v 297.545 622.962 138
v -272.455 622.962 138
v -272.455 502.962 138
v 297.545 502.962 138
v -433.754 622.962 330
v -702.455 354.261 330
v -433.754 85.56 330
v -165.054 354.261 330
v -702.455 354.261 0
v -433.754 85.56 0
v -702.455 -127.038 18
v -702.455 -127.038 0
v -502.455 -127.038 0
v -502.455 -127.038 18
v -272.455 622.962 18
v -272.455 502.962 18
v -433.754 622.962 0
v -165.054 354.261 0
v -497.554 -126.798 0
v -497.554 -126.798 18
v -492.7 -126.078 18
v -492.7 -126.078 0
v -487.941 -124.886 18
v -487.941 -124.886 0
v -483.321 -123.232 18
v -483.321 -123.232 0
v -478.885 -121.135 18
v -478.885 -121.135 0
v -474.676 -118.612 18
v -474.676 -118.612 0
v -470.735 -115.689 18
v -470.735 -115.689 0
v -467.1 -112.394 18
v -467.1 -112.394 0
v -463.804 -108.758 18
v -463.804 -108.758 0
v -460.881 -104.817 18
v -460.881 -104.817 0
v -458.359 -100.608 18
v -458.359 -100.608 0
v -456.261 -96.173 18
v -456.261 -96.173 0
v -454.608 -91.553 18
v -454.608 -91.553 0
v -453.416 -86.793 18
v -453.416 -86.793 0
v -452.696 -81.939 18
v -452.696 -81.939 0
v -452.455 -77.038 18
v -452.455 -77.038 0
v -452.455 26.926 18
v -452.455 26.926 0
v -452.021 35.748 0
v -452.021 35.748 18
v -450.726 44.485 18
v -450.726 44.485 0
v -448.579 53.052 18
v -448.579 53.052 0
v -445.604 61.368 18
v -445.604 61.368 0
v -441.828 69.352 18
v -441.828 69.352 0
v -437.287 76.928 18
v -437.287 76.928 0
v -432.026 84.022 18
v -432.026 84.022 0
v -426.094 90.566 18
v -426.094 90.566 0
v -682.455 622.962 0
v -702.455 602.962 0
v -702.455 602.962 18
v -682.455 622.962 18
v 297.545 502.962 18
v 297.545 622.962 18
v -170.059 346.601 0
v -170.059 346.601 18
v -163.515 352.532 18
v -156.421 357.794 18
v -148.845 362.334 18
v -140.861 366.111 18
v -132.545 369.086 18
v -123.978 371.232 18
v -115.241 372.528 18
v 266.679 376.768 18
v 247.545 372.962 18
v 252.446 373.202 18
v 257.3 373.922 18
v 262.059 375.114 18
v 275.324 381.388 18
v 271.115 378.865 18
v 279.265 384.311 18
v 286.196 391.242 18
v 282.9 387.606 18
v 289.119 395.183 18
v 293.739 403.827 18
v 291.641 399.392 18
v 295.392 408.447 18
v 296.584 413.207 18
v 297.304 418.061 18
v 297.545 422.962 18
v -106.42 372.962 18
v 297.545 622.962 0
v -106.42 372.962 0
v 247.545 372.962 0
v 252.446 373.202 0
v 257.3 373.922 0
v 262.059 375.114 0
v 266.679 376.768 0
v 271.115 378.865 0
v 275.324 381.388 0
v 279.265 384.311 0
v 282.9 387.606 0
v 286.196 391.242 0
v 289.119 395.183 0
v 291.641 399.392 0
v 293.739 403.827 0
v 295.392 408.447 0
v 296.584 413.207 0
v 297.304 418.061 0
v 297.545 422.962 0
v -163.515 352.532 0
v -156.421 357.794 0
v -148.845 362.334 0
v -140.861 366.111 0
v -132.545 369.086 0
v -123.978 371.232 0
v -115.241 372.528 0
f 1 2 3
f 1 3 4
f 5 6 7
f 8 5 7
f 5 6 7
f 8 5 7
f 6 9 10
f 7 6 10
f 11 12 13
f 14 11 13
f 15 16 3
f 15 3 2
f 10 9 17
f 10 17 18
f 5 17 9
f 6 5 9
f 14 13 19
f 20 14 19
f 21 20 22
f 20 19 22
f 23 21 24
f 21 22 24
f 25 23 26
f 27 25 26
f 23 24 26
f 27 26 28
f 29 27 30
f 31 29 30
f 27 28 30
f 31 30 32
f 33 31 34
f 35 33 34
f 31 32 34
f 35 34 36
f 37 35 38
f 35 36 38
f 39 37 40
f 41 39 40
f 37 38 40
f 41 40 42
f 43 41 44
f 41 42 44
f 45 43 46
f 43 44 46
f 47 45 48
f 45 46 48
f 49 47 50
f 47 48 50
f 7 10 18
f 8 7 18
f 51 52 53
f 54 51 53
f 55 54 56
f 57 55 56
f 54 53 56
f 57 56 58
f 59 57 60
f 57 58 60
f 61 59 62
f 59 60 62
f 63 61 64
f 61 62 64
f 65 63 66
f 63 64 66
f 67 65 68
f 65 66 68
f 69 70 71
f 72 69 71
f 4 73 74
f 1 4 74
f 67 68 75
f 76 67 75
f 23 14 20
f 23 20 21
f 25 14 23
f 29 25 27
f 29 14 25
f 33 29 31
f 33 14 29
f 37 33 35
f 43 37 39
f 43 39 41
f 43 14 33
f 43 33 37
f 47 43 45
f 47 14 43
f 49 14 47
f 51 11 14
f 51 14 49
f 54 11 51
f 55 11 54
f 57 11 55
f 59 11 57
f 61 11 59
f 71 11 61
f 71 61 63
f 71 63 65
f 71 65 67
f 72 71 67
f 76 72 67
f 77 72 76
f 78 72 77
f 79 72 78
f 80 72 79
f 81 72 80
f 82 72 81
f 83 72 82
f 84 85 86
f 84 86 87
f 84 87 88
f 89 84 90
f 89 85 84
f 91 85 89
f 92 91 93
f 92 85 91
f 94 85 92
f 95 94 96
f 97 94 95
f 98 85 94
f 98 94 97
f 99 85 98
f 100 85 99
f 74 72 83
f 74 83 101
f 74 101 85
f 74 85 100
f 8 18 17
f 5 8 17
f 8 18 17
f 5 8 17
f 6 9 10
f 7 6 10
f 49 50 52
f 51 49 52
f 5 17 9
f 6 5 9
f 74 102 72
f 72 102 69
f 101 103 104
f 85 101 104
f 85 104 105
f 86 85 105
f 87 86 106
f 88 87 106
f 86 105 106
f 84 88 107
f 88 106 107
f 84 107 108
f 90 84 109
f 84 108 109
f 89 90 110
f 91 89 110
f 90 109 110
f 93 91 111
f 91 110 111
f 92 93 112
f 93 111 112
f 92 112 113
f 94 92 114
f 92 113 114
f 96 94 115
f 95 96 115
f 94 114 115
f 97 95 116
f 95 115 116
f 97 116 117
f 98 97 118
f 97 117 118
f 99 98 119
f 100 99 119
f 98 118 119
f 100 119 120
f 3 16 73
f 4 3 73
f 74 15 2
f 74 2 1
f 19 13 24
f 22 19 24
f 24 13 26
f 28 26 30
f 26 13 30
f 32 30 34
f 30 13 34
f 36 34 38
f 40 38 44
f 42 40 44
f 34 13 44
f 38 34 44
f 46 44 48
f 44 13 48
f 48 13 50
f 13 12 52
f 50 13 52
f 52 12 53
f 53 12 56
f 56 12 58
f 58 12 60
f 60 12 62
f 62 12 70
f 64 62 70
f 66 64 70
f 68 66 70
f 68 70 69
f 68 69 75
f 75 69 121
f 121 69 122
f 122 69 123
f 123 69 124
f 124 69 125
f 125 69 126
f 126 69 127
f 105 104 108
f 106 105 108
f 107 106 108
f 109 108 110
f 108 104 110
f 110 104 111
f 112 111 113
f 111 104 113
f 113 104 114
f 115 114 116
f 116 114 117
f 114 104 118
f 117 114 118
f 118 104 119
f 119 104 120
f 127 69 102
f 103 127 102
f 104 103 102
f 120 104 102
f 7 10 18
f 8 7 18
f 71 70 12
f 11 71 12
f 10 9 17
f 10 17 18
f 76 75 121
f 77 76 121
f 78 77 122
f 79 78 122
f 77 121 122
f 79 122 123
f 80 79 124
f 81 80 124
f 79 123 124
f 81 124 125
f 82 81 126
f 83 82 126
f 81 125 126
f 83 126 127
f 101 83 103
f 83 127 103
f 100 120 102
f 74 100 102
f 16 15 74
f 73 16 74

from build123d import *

# Parameters (mm, degrees)
F1_DEPTH = 18
F2_SIZE  = 20
F4_DEPTH = 330
F5_DEPTH = 330
F6_W     = 570
F6_H     = 120
F7_DEPTH = 120


with BuildPart() as f1:
    # F0 (on Top) → F1 (new body)
    with BuildSketch(Plane.XY):
        with BuildLine():
            Line((297.545134, 622.961507), (-702.454866, 622.961507))
            Line((-702.454866, 622.961507), (-702.454866, -127.038493))
            Line((-702.454866, -127.038493), (-502.454866, -127.038493))
            ThreePointArc((-502.454866, -127.038493), (-467.099527, -112.393832), (-452.454866, -77.038493))
            Line((-452.454866, -77.038493), (-452.454866, 26.926395))
            ThreePointArc((-452.454866, 26.926395), (-445.604024, 61.367904), (-426.094476, 90.566006))
            Line((-426.094476, 90.566006), (-170.059364, 346.601117))
            ThreePointArc((-170.059364, 346.601117), (-140.861263, 366.110665), (-106.419754, 372.961507))
            Line((-106.419754, 372.961507), (247.545134, 372.961507))
            ThreePointArc((247.545134, 372.961507), (282.900473, 387.606168), (297.545134, 422.961507))
            Line((297.545134, 422.961507), (297.545134, 622.961507))
        make_face()
    extrude(amount=F1_DEPTH)

    # F2
    f2_edges = [f1.edges().sort_by_distance(p)[0] for p in [
        (-702.454866, 622.961507, 9),
    ]]
    chamfer(f2_edges, length=F2_SIZE)


with BuildPart() as f4:
    # F3 (on Top) → F4 (new body)
    with BuildSketch(Plane.XY):
        Polygon((-433.754289, 622.961507), (-702.454866, 354.26093), (-433.754289, 85.560353), (-165.053712, 354.26093), align=None)
    extrude(amount=F4_DEPTH)


with BuildPart() as f5:
    # F3 (on Top) → F5 (new body)
    with BuildSketch(Plane.XY):
        Polygon((-433.754289, 622.961507), (-702.454866, 354.26093), (-433.754289, 85.560353), (-165.053712, 354.26093), align=None)
    extrude(amount=F5_DEPTH)


with BuildPart() as f7:
    # F6 (on face) → F7 (new body)
    with BuildSketch(Plane.XY.offset(18)):
        with Locations((12.545134, 562.961507)):
            Rectangle(F6_W, F6_H)
    extrude(amount=F7_DEPTH)


solid = Compound([f1.part, f4.part, f5.part, f7.part])
